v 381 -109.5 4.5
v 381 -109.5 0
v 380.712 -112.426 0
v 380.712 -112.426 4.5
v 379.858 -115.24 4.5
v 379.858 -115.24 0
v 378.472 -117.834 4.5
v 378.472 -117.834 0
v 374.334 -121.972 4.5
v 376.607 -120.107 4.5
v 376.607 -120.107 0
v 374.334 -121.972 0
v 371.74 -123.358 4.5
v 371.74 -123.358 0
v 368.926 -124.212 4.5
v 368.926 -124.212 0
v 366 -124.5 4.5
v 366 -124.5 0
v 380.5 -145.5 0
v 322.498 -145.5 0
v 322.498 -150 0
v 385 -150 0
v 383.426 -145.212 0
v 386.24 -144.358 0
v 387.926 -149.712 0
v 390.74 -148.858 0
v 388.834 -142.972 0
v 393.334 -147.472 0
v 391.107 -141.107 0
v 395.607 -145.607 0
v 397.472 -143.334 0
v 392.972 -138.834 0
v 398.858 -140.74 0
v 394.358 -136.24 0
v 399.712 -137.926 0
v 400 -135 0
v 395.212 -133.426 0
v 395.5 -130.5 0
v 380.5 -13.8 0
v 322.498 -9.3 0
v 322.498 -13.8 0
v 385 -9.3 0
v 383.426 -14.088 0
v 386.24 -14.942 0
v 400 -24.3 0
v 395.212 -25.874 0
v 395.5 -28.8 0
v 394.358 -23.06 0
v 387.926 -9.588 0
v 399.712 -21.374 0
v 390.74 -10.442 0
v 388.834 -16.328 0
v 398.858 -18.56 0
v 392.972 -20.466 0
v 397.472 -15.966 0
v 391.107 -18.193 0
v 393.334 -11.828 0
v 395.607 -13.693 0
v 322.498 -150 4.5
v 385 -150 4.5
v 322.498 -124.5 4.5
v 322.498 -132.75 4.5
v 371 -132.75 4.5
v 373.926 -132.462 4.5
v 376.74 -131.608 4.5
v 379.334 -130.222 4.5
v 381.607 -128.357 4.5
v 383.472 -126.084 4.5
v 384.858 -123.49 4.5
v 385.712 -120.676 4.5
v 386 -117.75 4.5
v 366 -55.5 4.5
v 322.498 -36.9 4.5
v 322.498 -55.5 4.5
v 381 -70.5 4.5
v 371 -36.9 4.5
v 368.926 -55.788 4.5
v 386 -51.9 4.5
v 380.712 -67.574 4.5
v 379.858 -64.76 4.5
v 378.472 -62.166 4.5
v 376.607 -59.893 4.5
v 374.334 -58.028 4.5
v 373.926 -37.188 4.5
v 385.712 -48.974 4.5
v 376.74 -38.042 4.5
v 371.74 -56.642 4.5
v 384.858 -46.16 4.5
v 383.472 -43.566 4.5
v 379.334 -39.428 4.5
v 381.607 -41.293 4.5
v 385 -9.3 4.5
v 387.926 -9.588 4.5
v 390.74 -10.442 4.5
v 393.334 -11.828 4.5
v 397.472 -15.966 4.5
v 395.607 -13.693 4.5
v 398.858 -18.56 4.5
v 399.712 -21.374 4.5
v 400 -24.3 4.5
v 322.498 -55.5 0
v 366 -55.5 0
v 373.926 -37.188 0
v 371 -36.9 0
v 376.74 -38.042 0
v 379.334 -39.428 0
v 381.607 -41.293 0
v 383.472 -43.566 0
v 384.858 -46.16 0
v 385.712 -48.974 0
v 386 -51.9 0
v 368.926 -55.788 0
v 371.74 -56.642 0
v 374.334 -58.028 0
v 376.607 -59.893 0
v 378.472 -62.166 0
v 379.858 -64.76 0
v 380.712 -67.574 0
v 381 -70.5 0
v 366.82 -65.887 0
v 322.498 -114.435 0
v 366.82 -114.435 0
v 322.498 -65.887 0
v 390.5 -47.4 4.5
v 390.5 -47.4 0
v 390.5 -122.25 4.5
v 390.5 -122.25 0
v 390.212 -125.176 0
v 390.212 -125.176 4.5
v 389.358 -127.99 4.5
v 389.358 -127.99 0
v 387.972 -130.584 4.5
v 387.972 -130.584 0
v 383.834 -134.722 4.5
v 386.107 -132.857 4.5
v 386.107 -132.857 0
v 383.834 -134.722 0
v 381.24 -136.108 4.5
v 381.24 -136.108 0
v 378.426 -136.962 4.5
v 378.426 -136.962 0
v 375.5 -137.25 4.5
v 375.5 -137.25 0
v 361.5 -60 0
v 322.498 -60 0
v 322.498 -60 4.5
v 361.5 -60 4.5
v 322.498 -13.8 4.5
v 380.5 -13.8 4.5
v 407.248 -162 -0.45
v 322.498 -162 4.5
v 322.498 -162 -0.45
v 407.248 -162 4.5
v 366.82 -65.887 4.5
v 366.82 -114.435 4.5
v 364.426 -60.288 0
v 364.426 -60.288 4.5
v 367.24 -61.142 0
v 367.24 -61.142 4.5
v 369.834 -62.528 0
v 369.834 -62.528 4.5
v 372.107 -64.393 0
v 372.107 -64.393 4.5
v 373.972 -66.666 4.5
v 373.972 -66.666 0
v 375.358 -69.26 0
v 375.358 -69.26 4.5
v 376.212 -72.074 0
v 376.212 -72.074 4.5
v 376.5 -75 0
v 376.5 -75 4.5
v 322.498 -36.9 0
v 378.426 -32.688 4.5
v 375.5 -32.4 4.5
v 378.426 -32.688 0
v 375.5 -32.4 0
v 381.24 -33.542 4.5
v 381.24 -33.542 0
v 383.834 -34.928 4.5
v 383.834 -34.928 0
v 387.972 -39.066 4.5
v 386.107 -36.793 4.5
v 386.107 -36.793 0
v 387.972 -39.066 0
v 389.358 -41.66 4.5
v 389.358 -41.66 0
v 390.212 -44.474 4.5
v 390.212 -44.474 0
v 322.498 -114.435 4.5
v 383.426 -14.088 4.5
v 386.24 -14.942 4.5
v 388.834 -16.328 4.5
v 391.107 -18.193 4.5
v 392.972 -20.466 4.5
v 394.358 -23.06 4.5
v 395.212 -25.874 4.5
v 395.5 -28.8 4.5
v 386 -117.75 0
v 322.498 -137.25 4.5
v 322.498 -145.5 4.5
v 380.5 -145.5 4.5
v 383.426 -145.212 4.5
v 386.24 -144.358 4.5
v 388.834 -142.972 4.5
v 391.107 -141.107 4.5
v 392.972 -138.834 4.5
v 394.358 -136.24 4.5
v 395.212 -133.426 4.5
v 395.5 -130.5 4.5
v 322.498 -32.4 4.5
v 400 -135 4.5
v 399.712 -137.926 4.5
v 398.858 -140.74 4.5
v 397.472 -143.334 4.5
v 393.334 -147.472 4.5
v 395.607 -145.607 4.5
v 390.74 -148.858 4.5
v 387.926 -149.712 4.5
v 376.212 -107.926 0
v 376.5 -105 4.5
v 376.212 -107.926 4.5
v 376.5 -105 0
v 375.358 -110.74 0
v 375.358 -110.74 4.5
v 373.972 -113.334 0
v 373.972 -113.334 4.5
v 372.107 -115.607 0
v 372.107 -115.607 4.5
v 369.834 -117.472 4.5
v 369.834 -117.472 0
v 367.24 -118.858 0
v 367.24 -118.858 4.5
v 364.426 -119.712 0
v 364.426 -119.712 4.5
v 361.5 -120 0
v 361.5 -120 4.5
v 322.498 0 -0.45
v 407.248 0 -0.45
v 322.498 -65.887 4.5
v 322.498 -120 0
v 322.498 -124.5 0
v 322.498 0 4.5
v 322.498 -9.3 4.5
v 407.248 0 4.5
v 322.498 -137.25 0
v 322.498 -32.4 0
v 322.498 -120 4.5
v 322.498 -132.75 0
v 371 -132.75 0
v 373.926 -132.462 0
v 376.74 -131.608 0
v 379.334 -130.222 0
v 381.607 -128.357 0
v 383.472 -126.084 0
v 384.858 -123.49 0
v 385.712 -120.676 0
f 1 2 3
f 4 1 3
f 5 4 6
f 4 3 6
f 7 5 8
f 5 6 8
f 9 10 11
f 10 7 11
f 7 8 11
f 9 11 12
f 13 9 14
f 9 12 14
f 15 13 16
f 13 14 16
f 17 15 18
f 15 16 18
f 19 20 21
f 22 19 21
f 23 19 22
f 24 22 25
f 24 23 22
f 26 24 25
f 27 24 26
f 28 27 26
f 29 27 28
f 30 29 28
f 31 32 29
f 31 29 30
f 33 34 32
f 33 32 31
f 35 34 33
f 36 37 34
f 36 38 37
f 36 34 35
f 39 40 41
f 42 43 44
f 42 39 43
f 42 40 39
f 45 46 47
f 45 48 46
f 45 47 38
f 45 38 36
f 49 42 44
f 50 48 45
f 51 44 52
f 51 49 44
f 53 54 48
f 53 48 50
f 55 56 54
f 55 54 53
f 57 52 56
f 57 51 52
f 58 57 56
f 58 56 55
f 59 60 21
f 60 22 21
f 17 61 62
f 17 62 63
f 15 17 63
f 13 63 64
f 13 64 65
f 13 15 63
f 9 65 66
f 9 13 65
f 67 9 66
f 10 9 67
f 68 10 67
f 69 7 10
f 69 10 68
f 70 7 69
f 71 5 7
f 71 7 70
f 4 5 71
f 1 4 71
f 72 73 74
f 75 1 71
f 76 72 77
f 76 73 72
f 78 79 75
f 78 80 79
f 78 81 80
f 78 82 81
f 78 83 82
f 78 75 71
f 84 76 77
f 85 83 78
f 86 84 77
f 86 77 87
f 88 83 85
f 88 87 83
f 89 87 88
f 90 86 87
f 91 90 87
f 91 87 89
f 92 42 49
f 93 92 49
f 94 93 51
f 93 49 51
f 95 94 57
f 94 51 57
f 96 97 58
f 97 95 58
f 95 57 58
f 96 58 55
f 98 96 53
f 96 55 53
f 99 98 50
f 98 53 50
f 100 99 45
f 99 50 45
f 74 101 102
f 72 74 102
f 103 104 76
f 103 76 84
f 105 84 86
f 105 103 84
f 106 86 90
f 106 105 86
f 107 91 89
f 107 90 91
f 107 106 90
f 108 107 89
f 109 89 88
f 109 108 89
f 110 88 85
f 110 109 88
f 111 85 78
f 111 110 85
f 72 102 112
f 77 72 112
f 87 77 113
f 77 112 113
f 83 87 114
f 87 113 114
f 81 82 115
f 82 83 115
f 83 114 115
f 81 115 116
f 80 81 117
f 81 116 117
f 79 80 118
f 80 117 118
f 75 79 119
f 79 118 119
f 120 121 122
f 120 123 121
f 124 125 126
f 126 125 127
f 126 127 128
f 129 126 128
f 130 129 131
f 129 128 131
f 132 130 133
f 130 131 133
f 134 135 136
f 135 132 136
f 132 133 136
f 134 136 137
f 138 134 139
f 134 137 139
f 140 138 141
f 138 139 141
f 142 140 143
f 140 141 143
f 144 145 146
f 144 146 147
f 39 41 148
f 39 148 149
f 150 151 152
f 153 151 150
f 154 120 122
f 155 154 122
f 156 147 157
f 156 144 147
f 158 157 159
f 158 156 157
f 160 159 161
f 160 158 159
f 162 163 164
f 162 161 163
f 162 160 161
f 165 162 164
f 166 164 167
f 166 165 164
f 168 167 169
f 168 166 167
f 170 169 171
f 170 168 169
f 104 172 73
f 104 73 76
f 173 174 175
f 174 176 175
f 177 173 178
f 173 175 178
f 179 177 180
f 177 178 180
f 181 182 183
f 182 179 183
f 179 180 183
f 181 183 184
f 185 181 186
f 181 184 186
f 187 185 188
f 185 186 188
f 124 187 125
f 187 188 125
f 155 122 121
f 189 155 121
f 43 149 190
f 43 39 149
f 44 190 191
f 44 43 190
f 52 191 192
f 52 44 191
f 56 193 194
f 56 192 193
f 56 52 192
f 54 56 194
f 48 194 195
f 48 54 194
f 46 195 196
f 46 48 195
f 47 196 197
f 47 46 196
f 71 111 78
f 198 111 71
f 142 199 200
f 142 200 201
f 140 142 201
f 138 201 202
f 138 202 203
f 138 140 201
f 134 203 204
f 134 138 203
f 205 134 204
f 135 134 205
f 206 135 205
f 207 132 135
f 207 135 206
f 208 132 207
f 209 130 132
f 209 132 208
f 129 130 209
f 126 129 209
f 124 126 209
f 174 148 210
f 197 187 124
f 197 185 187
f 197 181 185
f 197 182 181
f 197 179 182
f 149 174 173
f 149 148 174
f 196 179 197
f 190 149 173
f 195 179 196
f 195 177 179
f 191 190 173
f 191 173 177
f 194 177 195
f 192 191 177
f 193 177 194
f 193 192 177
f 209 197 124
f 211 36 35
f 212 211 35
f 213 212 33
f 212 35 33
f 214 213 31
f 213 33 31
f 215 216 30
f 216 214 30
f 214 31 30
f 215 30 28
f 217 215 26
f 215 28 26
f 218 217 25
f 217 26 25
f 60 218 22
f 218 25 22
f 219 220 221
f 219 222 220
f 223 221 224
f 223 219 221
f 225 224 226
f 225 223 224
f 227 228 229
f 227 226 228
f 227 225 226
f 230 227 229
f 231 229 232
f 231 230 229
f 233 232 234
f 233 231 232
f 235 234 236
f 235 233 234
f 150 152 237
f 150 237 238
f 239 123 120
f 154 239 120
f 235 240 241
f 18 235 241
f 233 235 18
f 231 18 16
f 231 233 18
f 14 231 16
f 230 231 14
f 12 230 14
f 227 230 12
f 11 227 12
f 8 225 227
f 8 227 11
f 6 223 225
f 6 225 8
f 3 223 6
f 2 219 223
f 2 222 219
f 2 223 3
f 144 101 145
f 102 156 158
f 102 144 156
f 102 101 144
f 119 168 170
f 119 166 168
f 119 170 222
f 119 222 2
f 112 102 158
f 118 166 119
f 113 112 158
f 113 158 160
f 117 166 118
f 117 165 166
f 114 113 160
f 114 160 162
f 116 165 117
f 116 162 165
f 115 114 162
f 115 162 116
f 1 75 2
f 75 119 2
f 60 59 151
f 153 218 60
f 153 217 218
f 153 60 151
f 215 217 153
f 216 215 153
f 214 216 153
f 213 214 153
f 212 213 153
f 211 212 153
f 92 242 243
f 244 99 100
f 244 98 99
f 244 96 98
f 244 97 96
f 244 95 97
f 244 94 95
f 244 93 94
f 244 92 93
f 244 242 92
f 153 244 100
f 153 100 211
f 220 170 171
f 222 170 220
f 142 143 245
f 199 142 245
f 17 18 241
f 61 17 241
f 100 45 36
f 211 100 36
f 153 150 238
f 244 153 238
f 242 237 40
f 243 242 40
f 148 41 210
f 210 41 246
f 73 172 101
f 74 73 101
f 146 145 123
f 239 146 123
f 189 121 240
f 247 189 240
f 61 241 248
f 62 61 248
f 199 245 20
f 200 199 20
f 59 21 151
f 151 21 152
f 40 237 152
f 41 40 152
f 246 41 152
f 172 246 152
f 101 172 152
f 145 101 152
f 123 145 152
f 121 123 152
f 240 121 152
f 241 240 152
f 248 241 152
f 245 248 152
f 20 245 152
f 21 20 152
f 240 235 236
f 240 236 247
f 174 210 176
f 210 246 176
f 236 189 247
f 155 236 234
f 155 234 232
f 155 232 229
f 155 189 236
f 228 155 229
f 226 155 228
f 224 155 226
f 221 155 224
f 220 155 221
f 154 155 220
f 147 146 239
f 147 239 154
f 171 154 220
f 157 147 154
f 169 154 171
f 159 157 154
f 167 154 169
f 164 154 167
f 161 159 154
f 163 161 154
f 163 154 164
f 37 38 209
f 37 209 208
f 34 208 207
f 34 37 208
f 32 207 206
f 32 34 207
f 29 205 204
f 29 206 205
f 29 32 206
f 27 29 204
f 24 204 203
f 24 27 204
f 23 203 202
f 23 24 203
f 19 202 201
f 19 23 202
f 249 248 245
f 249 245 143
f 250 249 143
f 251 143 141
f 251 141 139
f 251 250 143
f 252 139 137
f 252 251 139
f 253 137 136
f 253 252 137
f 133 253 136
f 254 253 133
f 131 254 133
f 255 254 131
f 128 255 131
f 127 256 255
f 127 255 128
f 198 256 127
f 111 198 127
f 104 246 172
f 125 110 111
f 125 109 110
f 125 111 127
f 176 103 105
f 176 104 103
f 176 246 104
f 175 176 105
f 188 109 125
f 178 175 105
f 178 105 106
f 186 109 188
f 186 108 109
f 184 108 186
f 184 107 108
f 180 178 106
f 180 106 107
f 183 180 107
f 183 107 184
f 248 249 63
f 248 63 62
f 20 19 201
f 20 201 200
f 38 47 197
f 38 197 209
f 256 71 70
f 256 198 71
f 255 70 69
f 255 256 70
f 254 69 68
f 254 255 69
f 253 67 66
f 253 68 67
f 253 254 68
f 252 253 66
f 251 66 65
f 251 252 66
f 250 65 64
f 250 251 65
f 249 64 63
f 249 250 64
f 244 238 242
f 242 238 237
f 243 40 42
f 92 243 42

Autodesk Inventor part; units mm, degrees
ref_plane "YZ Plane" through (0, 0, 0) normal (1, 0, 0) x (0, 1, 0)
sketch "Sketch1" plane through (0, 0, 0) normal (0, 0, 1) x (1, 0, 0)
  line L0 (6.5, -9.3) -> (385, -9.3)
  line L1 (400, -24.3) -> (400, -135)
  line L2 (385, -150) -> (-400, -150)
  line L3 (-400, -150) -> (-400, -32.4)
  line L4 (6.5, -9.3) -> (6.5, -13.8)
  line L5 (6.5, -13.8) -> (380.5, -13.8)
  line L6 (395.5, -28.8) -> (395.5, -130.5)
  line L7 (380.5, -145.5) -> (-395.5, -145.5)
  line L8 (-400, -32.4) -> (375.5, -32.4)
  line L9 (390.5, -47.4) -> (390.5, -122.25)
  line L10 (375.5, -137.25) -> (-387.25, -137.25)
  line L11 (-395.5, -145.5) -> (-395.5, -36.9)
  line L12 (-395.5, -36.9) -> (371, -36.9)
  line L13 (386, -51.9) -> (386, -117.75)
  line L14 (371, -132.75) -> (-382.75, -132.75)
  line L15 (-382.75, -132.75) -> (-382.75, -60)
  line L16 (-387.25, -137.25) -> (-387.25, -55.5)
  line L17 (-387.25, -55.5) -> (366, -55.5)
  line L18 (381, -70.5) -> (381, -109.5)
  line L19 (-382.75, -60) -> (361.5, -60)
  line L20 (376.5, -75) -> (376.5, -105)
  line L21 (361.5, -120) -> (-374.5, -120)
  line L22 (366, -124.5) -> (-374.5, -124.5)
  line L23 (-374.5, -124.5) -> (-374.5, -120)
  arc A0 (400, -24.3) -> (385, -9.3) centre (385, -24.3) ccw
  arc A1 (395.5, -28.8) -> (380.5, -13.8) centre (380.5, -28.8) ccw
  arc A2 (390.5, -47.4) -> (375.5, -32.4) centre (375.5, -47.4) ccw
  arc A3 (386, -51.9) -> (371, -36.9) centre (371, -51.9) ccw
  arc A4 (381, -70.5) -> (366, -55.5) centre (366, -70.5) ccw
  arc A5 (376.5, -75) -> (361.5, -60) centre (361.5, -75) ccw
  arc A6 (361.5, -120) -> (376.5, -105) centre (361.5, -105) ccw
  arc A7 (366, -124.5) -> (381, -109.5) centre (366, -109.5) ccw
  arc A8 (371, -132.75) -> (386, -117.75) centre (371, -117.75) ccw
  arc A9 (375.5, -137.25) -> (390.5, -122.25) centre (375.5, -122.25) ccw
  arc A10 (380.5, -145.5) -> (395.5, -130.5) centre (380.5, -130.5) ccw
  arc A11 (385, -150) -> (400, -135) centre (385, -135) ccw
  line L24 (322.4983, 0) -> (322.4983, -162)
  line L25 (322.4983, -162) -> (407.2483, -162)
  line L26 (407.2483, -162) -> (407.2483, 0)
  line L27 (407.2483, 0) -> (322.4983, 0)
  line L28 (-561.4497, 0) -> (568.6979, 0) projected
  line L29 (322.4983, -123.614) -> (322.4983, -76.5697)
  line L30 (322.4983, -65.8872) -> (366.8197, -65.8872)
  line L31 (366.8197, -65.8872) -> (366.8197, -114.4349)
  line L32 (366.8197, -114.4349) -> (322.4983, -114.4349)
  point P0 (0, 0)
  point P1 (400, -9.3)
  point P2 (400, -150)
  point P3 (395.5, -13.8)
  point P4 (395.5, -145.5)
  point P5 (390.5, -32.4)
  point P6 (390.5, -137.25)
  point P7 (386, -36.9)
  point P8 (386, -132.75)
  point P9 (381, -55.5)
  point P10 (381, -124.5)
  point P11 (376.5, -60)
  point P12 (376.5, -120)
  point P13 (0, 0)
  point P14 (322.4983, -60)
  point P15 (322.4983, -120)
  point P16 (322.4983, -36.9)
  point P17 (322.4983, -55.5)
  point P18 (322.4983, -124.5)
  point P19 (322.4983, -132.75)
  point P20 (322.4983, -13.8)
  point P21 (322.4983, -32.4)
  point P22 (322.4983, -137.25)
  point P23 (322.4983, -145.5)
  point P24 (322.4983, -150)
  point P25 (322.4983, -9.3)
  dimension "d1" = 4.5
  dimension "d2" = 4.5
  dimension "d3" = 4.5
  dimension "d5" = 800
  dimension "d6" = 400
  dimension "d7" = 4.5
  dimension "d8" = 4.5
  dimension "d9" = 5
  dimension "d10" = 4.5
  dimension "d11" = 18.6
  dimension "d12" = 4.5
  dimension "d13" = 8.25
  dimension "d14" = 4.5
  dimension "d15" = 4.5
  dimension "d16" = 4.5
  dimension "d17" = 5
  dimension "d19" = 18.6
  dimension "d20" = 8.25
  dimension "d89" = 8.25
  dimension "d90" = 8.25
  dimension "d91" = 15
  dimension "d104" = 84.75
  dimension "d106" = 162
extrude "Extrusion1" add sketch "Sketch1" along normal blind 4.5 contours L24 L27 L26 L25 L2 A11 L1 A0 L0 | L5 A1 L6 A10 L7 L24 L10 A9 L9 A2 L8 | L12 A3 L13 A8 L14 L24 L22 A7 L18 A4 L17 | L19 A5 L20 A6 L21 L24 L32 L31 L30
extrude "Extrusion7" add sketch "Sketch1" against normal blind 0.45 contours L24 L27 L26 L25 L2 A11 L1 A0 L0 | L0 A0 L1 A11 L2 L24 L7 A10 L6 A1 L5 | L5 A1 L6 A10 L7 L24 L10 A9 L9 A2 L8 | L8 A2 L9 A9 L10 L24 L14 A8 L13 A3 L12 | L12 A3 L13 A8 L14 L24 L22 A7 L18 A4 L17 | L17 A4 L18 A7 L22 L24 L21 A6 L20 A5 L19 | L19 A5 L20 A6 L21 L24 L32 L31 L30 | L30 L31 L32 L24
equation "\"d1\" = wire_diameter"
equation "\"d2\" = wire_diameter"
equation "\"d3\" = wire_diameter"
equation "\"d5\" = track_length"
equation "\"d6\" = 0.5 * track_length"
equation "\"d7\" = wire_diameter"
equation "\"d8\" = wire_diameter"
equation "\"d10\" = wire_diameter"
equation "\"d11\" = distance_between_wires"
equation "\"d12\" = wire_diameter"
equation "\"d13\" = distance_between_wires_edge"
equation "\"d14\" = wire_diameter"
equation "\"d15\" = wire_diameter"
equation "\"d16\" = wire_diameter"
equation "\"d19\" = distance_between_wires"
equation "\"d20\" = distance_between_wires_edge"
equation "\"d22\" = wire_diameter"
equation "\"track_length\" = 800"
equation "\"wire_diameter\" = 4.5"
equation "\"distance_between_wires\" = -1.2 * wire_diameter + 0.2 * parameter_6"
equation "\"distance_between_wires_edge\" = 8.25"
equation "\"bend_radius\" = 15"
equation "\"parameter_6\" = 120"
properties part number "primary_coil_0R2_test_cut"
